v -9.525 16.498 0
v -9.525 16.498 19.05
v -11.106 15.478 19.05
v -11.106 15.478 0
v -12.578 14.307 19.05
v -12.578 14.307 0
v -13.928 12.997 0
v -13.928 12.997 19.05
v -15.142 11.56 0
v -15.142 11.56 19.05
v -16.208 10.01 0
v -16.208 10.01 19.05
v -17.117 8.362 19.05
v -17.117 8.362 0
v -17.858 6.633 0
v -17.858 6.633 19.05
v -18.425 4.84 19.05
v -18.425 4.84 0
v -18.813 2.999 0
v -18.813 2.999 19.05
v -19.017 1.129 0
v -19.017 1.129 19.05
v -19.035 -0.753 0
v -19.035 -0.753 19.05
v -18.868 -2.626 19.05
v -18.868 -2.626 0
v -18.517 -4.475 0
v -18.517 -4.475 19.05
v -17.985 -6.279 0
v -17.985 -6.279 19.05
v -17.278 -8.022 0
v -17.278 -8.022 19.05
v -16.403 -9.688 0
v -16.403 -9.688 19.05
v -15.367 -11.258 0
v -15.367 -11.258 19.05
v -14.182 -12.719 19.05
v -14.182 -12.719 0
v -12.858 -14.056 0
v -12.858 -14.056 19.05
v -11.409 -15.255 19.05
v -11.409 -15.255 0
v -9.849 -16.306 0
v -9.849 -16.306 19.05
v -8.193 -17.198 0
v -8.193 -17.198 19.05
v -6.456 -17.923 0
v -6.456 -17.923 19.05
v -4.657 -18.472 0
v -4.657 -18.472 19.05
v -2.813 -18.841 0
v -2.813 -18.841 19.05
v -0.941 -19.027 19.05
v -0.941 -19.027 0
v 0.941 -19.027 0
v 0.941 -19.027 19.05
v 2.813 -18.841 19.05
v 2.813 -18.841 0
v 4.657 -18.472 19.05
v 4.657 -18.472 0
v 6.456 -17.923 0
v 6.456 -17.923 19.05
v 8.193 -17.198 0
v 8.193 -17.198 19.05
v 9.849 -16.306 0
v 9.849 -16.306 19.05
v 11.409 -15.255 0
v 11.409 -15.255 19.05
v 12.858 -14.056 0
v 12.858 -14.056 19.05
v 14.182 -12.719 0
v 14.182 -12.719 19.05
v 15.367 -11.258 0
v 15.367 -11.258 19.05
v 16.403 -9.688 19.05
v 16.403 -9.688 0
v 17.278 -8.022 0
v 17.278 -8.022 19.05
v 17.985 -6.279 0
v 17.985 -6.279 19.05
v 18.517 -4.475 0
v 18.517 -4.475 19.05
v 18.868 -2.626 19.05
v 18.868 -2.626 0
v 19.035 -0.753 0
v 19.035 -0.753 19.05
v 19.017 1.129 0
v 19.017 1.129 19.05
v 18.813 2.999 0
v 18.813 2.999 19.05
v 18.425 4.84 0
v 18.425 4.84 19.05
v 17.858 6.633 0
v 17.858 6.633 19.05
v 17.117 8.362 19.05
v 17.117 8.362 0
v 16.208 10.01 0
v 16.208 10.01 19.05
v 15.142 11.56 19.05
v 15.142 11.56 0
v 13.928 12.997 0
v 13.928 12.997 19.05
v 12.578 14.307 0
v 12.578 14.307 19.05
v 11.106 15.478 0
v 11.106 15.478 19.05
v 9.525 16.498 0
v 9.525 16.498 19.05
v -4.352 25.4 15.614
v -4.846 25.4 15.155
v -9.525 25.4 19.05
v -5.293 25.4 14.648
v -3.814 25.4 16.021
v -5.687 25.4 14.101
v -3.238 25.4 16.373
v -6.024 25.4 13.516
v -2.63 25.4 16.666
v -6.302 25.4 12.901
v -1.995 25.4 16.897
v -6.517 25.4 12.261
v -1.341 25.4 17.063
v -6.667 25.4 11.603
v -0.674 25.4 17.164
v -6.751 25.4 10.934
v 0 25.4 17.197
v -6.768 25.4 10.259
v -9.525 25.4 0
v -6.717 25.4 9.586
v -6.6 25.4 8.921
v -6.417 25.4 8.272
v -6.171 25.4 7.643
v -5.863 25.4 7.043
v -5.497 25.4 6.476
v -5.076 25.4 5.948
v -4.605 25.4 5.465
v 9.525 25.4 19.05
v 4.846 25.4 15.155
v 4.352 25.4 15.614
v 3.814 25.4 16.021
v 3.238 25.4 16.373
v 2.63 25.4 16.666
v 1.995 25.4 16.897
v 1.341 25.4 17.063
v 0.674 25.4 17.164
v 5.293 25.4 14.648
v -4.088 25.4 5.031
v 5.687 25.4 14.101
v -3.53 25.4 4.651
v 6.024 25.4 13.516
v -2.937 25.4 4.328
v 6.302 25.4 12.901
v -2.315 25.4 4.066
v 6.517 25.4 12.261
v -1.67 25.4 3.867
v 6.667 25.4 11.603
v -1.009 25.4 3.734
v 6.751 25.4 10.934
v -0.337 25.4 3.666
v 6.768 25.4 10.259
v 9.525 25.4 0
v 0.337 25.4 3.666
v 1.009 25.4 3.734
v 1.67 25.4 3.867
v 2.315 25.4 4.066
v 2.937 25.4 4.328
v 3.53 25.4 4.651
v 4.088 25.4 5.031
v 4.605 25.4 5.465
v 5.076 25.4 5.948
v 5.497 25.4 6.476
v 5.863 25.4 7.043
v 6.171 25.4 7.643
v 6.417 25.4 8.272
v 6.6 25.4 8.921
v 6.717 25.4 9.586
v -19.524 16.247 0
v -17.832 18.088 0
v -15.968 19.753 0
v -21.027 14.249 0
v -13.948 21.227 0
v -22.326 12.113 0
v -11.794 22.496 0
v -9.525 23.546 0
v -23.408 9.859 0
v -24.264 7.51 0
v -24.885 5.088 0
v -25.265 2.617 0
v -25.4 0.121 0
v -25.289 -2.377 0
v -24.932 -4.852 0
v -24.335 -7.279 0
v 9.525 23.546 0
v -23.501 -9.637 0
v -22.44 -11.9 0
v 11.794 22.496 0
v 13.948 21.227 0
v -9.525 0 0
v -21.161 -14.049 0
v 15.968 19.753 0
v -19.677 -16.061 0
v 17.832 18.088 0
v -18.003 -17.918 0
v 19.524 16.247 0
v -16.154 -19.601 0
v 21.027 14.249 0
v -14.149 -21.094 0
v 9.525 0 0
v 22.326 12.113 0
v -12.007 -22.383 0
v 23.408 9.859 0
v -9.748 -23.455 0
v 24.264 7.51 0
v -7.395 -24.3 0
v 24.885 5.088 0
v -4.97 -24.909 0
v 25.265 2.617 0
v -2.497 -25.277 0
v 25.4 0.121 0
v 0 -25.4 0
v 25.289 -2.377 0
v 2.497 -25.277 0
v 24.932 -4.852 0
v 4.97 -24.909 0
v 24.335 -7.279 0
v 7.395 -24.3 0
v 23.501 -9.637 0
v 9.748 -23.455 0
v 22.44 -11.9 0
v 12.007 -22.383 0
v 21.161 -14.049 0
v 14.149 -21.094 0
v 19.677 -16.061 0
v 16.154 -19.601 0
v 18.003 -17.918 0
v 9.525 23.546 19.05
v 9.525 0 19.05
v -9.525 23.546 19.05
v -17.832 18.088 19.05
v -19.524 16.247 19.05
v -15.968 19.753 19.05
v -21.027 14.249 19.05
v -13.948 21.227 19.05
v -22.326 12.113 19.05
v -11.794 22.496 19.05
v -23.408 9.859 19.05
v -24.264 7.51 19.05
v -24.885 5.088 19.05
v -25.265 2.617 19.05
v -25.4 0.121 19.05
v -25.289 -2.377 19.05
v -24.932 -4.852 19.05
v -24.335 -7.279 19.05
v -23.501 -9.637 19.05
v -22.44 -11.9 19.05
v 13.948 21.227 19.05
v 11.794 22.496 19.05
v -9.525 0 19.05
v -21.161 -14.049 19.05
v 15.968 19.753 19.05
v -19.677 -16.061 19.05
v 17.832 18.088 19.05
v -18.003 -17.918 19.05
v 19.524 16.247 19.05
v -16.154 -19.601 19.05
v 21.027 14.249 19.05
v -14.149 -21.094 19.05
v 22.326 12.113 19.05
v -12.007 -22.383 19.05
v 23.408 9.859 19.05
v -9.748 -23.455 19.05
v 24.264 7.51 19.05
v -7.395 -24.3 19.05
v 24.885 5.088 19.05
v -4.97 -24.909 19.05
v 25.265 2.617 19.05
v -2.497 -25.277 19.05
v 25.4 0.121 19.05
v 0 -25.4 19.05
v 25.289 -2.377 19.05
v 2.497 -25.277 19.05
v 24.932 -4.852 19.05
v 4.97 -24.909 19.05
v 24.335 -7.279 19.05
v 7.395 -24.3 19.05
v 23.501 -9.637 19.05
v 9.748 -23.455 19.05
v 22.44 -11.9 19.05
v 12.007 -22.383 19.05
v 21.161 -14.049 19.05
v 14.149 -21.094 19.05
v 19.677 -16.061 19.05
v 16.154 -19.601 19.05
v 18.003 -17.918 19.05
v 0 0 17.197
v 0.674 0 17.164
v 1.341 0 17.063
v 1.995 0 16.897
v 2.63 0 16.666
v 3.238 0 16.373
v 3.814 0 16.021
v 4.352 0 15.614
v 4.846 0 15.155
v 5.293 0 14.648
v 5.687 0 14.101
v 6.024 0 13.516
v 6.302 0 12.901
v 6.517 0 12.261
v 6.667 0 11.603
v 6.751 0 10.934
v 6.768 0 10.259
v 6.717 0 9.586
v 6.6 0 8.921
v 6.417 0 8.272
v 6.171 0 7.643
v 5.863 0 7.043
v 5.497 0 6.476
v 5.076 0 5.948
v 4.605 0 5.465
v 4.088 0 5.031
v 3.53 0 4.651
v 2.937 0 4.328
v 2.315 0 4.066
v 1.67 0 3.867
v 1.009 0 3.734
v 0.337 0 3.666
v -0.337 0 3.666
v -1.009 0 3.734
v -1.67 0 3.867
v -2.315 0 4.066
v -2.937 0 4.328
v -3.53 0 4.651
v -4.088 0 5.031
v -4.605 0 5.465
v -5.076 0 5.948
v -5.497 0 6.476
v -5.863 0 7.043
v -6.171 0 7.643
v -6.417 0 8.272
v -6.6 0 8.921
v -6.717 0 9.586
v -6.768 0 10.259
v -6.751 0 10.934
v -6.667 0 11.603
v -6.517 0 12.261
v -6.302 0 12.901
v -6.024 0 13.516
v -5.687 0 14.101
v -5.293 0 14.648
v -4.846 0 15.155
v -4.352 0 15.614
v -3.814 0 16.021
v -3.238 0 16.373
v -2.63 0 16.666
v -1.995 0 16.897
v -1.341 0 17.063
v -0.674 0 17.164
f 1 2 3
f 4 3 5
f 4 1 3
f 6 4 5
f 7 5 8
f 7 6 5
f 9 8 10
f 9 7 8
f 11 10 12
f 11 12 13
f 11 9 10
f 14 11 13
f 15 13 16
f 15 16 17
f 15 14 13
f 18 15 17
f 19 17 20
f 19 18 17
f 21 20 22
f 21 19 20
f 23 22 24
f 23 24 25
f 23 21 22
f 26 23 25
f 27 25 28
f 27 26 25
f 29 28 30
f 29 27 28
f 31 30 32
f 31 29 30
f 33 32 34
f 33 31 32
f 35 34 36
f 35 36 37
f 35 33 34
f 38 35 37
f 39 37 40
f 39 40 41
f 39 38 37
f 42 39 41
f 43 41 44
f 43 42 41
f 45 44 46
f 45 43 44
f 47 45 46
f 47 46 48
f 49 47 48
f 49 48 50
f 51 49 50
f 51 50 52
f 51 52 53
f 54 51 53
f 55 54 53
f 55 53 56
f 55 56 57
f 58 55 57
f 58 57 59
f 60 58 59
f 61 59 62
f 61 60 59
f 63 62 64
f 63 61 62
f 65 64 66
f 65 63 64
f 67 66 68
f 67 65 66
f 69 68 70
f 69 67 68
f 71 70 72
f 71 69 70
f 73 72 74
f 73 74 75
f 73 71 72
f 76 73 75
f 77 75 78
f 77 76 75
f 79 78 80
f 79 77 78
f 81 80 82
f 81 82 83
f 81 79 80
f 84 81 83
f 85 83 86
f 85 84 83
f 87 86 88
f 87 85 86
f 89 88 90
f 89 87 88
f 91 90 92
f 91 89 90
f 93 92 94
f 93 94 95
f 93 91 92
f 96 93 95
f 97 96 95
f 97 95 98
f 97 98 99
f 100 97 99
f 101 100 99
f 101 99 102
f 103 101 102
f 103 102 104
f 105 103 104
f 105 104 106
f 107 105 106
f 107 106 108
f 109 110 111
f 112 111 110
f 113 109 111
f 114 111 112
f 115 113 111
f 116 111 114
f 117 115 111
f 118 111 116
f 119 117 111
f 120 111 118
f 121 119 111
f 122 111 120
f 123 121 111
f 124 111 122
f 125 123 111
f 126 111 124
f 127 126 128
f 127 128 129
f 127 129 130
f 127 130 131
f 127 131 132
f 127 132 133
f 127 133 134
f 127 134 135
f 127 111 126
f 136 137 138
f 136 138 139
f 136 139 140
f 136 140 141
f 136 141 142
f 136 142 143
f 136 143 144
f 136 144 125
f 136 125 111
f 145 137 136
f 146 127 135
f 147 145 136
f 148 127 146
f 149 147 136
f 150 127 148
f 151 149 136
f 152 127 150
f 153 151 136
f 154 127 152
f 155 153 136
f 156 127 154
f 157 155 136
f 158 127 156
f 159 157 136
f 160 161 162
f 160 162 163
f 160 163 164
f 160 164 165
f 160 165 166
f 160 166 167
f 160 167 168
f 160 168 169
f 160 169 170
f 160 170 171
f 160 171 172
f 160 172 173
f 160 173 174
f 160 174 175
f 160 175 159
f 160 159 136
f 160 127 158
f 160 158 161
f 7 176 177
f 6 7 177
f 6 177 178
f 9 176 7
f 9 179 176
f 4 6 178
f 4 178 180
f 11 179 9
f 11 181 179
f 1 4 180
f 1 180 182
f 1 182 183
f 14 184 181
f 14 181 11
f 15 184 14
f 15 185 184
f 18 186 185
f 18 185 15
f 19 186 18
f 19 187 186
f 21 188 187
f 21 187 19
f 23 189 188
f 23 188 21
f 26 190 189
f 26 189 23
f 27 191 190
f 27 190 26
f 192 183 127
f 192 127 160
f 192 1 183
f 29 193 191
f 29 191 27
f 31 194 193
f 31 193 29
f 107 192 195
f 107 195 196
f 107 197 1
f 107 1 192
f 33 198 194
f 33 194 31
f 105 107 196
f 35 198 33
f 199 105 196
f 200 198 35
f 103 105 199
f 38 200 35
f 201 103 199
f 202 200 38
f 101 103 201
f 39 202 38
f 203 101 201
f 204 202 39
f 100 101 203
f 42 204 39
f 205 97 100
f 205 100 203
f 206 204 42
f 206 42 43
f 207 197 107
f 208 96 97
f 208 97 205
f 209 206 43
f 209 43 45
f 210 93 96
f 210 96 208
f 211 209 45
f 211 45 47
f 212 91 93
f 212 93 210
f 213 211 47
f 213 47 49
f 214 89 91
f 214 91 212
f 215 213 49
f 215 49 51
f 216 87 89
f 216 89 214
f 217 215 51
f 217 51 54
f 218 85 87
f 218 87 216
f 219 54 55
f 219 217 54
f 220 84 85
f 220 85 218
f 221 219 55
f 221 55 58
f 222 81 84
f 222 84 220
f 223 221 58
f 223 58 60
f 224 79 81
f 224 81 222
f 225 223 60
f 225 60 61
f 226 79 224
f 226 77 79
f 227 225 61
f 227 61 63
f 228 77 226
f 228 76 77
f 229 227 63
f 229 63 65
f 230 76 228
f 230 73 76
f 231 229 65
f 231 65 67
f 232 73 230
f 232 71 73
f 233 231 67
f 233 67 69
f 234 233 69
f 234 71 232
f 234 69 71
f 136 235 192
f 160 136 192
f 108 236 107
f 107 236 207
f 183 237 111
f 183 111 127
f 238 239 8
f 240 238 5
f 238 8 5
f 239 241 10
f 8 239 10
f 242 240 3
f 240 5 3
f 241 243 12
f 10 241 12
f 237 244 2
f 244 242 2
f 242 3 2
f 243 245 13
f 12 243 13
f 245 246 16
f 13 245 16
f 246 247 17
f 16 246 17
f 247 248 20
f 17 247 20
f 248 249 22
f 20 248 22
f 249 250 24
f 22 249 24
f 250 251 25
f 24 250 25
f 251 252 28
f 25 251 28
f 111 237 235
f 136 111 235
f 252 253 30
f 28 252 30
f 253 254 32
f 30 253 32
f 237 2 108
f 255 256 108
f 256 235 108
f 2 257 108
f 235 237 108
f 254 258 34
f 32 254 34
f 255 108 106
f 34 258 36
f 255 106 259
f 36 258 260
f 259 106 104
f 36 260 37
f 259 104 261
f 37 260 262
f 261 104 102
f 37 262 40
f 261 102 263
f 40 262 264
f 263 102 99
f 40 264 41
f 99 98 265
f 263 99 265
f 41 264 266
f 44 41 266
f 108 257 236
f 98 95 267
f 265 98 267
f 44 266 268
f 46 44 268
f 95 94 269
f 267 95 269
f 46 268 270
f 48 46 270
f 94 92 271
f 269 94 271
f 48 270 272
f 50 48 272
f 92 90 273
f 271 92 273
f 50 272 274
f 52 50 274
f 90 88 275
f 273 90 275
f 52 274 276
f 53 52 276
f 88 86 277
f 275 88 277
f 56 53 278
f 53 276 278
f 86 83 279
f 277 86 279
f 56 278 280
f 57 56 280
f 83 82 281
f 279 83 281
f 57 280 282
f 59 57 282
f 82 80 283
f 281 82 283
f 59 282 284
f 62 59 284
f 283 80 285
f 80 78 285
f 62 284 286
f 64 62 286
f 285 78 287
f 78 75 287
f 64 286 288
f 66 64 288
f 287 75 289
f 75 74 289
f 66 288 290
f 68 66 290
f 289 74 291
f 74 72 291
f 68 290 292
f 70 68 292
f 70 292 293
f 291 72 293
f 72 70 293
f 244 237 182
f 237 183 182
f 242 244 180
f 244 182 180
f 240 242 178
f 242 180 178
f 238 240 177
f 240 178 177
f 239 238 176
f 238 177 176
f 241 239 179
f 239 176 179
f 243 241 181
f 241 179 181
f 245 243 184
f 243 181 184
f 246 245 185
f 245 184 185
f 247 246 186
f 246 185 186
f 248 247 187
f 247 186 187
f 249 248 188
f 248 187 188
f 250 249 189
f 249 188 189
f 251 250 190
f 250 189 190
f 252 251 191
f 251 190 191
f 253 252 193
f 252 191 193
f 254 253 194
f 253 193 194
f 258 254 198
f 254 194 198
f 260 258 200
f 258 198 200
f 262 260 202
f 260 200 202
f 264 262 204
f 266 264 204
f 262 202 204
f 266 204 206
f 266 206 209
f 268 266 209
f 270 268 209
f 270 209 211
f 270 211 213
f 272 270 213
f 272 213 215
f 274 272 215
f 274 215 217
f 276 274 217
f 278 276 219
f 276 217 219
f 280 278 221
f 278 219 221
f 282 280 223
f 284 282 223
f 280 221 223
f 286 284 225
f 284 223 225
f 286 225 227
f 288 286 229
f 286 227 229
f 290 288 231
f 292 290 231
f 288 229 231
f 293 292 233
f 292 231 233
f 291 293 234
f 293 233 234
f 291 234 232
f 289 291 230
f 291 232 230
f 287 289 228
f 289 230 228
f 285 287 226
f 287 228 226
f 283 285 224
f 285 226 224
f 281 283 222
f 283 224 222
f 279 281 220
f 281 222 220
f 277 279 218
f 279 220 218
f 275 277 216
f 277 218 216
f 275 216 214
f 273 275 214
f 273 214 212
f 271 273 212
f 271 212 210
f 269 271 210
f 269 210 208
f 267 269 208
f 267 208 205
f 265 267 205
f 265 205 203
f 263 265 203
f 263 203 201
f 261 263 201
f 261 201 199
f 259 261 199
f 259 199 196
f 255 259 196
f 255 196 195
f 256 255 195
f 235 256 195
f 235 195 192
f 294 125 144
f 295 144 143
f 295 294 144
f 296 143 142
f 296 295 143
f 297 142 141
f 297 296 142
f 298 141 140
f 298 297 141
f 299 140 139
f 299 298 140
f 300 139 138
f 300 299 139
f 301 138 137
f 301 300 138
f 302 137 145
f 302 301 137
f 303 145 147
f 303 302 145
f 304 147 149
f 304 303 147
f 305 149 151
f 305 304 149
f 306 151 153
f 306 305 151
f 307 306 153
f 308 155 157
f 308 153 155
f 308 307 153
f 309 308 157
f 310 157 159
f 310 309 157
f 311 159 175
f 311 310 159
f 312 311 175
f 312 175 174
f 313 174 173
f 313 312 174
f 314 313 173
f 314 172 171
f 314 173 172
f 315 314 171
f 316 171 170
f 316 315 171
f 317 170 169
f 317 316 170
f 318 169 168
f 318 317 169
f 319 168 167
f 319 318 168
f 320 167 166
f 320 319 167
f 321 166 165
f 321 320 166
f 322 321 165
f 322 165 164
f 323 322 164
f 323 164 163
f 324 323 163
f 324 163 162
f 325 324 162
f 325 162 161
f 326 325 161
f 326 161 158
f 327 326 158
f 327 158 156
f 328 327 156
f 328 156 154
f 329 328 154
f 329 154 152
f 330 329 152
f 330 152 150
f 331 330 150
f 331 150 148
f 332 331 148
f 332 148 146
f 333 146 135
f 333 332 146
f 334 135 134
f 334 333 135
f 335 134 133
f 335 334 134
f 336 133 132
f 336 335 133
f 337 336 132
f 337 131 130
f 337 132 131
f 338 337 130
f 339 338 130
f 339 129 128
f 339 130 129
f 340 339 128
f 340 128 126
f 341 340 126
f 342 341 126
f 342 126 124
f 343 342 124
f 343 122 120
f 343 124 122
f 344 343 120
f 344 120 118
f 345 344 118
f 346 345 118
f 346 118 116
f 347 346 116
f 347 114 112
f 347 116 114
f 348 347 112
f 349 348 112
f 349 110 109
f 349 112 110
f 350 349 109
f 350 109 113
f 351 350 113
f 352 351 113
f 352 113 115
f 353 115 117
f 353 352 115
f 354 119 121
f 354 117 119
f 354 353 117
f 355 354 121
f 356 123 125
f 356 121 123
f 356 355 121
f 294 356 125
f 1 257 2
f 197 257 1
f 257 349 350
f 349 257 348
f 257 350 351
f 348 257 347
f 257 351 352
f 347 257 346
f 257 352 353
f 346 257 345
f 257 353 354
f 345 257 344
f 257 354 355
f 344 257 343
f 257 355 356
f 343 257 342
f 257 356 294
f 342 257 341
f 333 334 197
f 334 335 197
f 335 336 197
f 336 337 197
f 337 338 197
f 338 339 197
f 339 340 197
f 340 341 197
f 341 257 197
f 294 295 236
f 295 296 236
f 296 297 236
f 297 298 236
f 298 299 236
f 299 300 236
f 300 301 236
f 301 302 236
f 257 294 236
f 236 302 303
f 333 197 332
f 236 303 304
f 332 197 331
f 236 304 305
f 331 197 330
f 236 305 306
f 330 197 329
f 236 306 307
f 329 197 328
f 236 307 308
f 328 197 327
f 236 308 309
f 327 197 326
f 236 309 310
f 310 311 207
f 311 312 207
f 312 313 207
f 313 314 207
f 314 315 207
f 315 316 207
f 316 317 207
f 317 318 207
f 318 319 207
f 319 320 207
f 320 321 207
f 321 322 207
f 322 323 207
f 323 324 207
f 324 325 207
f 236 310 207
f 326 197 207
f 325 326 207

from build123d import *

# Parameters (mm, degrees)
SKETCH2_R               = 25.4
BOSS_EXTRUDE1_DEPTH     = 19.05
CUT_EXTRUDE1_DEPTH      = 41.659838908
CUT_EXTRUDE1_DEPTH_BACK = 41.659838908
SKETCH3_R               = 19.05
SKETCH4_W               = 19.05
SKETCH4_H               = 19.05
BOSS_EXTRUDE2_DEPTH     = 25.4
SKETCH7_R               = 6.769739398
CUT_EXTRUDE2_DEPTH      = 41.659838908


with BuildPart() as part:
    # Sketch2 → Boss-Extrude1 (new body)
    with BuildSketch(Plane.XY):
        with Locations(Location((0, 0, 0), (0, 0, 180))):
            Circle(SKETCH2_R)
    extrude(amount=BOSS_EXTRUDE1_DEPTH)

    # Sketch3 → Cut-Extrude1 (cut, two sides: drawn at the far end of the back side and taken through both)
    with BuildSketch(Plane.XY.offset(19.05).offset(-CUT_EXTRUDE1_DEPTH_BACK)):
        Circle(SKETCH3_R)
    extrude(amount=CUT_EXTRUDE1_DEPTH + CUT_EXTRUDE1_DEPTH_BACK, mode=Mode.SUBTRACT)

    # Sketch4 → Boss-Extrude2 (add)
    with BuildSketch(Plane(origin=(0, 0, 0), x_dir=(1, 0, 0), z_dir=(0, 1, 0))):
        with Locations((0, -9.525)):
            Rectangle(SKETCH4_W, SKETCH4_H)
    extrude(amount=BOSS_EXTRUDE2_DEPTH)

    # Sketch7 → Cut-Extrude2 (cut, through all)
    with BuildSketch(Plane(origin=(0, 0, 0), x_dir=(1, 0, 0), z_dir=(0, 1, 0))):
        with Locations(Location((0, -10.42763192, 0), (0, 0, 270))):
            Circle(SKETCH7_R)
    extrude(amount=CUT_EXTRUDE2_DEPTH, mode=Mode.SUBTRACT)


solid = part.part
